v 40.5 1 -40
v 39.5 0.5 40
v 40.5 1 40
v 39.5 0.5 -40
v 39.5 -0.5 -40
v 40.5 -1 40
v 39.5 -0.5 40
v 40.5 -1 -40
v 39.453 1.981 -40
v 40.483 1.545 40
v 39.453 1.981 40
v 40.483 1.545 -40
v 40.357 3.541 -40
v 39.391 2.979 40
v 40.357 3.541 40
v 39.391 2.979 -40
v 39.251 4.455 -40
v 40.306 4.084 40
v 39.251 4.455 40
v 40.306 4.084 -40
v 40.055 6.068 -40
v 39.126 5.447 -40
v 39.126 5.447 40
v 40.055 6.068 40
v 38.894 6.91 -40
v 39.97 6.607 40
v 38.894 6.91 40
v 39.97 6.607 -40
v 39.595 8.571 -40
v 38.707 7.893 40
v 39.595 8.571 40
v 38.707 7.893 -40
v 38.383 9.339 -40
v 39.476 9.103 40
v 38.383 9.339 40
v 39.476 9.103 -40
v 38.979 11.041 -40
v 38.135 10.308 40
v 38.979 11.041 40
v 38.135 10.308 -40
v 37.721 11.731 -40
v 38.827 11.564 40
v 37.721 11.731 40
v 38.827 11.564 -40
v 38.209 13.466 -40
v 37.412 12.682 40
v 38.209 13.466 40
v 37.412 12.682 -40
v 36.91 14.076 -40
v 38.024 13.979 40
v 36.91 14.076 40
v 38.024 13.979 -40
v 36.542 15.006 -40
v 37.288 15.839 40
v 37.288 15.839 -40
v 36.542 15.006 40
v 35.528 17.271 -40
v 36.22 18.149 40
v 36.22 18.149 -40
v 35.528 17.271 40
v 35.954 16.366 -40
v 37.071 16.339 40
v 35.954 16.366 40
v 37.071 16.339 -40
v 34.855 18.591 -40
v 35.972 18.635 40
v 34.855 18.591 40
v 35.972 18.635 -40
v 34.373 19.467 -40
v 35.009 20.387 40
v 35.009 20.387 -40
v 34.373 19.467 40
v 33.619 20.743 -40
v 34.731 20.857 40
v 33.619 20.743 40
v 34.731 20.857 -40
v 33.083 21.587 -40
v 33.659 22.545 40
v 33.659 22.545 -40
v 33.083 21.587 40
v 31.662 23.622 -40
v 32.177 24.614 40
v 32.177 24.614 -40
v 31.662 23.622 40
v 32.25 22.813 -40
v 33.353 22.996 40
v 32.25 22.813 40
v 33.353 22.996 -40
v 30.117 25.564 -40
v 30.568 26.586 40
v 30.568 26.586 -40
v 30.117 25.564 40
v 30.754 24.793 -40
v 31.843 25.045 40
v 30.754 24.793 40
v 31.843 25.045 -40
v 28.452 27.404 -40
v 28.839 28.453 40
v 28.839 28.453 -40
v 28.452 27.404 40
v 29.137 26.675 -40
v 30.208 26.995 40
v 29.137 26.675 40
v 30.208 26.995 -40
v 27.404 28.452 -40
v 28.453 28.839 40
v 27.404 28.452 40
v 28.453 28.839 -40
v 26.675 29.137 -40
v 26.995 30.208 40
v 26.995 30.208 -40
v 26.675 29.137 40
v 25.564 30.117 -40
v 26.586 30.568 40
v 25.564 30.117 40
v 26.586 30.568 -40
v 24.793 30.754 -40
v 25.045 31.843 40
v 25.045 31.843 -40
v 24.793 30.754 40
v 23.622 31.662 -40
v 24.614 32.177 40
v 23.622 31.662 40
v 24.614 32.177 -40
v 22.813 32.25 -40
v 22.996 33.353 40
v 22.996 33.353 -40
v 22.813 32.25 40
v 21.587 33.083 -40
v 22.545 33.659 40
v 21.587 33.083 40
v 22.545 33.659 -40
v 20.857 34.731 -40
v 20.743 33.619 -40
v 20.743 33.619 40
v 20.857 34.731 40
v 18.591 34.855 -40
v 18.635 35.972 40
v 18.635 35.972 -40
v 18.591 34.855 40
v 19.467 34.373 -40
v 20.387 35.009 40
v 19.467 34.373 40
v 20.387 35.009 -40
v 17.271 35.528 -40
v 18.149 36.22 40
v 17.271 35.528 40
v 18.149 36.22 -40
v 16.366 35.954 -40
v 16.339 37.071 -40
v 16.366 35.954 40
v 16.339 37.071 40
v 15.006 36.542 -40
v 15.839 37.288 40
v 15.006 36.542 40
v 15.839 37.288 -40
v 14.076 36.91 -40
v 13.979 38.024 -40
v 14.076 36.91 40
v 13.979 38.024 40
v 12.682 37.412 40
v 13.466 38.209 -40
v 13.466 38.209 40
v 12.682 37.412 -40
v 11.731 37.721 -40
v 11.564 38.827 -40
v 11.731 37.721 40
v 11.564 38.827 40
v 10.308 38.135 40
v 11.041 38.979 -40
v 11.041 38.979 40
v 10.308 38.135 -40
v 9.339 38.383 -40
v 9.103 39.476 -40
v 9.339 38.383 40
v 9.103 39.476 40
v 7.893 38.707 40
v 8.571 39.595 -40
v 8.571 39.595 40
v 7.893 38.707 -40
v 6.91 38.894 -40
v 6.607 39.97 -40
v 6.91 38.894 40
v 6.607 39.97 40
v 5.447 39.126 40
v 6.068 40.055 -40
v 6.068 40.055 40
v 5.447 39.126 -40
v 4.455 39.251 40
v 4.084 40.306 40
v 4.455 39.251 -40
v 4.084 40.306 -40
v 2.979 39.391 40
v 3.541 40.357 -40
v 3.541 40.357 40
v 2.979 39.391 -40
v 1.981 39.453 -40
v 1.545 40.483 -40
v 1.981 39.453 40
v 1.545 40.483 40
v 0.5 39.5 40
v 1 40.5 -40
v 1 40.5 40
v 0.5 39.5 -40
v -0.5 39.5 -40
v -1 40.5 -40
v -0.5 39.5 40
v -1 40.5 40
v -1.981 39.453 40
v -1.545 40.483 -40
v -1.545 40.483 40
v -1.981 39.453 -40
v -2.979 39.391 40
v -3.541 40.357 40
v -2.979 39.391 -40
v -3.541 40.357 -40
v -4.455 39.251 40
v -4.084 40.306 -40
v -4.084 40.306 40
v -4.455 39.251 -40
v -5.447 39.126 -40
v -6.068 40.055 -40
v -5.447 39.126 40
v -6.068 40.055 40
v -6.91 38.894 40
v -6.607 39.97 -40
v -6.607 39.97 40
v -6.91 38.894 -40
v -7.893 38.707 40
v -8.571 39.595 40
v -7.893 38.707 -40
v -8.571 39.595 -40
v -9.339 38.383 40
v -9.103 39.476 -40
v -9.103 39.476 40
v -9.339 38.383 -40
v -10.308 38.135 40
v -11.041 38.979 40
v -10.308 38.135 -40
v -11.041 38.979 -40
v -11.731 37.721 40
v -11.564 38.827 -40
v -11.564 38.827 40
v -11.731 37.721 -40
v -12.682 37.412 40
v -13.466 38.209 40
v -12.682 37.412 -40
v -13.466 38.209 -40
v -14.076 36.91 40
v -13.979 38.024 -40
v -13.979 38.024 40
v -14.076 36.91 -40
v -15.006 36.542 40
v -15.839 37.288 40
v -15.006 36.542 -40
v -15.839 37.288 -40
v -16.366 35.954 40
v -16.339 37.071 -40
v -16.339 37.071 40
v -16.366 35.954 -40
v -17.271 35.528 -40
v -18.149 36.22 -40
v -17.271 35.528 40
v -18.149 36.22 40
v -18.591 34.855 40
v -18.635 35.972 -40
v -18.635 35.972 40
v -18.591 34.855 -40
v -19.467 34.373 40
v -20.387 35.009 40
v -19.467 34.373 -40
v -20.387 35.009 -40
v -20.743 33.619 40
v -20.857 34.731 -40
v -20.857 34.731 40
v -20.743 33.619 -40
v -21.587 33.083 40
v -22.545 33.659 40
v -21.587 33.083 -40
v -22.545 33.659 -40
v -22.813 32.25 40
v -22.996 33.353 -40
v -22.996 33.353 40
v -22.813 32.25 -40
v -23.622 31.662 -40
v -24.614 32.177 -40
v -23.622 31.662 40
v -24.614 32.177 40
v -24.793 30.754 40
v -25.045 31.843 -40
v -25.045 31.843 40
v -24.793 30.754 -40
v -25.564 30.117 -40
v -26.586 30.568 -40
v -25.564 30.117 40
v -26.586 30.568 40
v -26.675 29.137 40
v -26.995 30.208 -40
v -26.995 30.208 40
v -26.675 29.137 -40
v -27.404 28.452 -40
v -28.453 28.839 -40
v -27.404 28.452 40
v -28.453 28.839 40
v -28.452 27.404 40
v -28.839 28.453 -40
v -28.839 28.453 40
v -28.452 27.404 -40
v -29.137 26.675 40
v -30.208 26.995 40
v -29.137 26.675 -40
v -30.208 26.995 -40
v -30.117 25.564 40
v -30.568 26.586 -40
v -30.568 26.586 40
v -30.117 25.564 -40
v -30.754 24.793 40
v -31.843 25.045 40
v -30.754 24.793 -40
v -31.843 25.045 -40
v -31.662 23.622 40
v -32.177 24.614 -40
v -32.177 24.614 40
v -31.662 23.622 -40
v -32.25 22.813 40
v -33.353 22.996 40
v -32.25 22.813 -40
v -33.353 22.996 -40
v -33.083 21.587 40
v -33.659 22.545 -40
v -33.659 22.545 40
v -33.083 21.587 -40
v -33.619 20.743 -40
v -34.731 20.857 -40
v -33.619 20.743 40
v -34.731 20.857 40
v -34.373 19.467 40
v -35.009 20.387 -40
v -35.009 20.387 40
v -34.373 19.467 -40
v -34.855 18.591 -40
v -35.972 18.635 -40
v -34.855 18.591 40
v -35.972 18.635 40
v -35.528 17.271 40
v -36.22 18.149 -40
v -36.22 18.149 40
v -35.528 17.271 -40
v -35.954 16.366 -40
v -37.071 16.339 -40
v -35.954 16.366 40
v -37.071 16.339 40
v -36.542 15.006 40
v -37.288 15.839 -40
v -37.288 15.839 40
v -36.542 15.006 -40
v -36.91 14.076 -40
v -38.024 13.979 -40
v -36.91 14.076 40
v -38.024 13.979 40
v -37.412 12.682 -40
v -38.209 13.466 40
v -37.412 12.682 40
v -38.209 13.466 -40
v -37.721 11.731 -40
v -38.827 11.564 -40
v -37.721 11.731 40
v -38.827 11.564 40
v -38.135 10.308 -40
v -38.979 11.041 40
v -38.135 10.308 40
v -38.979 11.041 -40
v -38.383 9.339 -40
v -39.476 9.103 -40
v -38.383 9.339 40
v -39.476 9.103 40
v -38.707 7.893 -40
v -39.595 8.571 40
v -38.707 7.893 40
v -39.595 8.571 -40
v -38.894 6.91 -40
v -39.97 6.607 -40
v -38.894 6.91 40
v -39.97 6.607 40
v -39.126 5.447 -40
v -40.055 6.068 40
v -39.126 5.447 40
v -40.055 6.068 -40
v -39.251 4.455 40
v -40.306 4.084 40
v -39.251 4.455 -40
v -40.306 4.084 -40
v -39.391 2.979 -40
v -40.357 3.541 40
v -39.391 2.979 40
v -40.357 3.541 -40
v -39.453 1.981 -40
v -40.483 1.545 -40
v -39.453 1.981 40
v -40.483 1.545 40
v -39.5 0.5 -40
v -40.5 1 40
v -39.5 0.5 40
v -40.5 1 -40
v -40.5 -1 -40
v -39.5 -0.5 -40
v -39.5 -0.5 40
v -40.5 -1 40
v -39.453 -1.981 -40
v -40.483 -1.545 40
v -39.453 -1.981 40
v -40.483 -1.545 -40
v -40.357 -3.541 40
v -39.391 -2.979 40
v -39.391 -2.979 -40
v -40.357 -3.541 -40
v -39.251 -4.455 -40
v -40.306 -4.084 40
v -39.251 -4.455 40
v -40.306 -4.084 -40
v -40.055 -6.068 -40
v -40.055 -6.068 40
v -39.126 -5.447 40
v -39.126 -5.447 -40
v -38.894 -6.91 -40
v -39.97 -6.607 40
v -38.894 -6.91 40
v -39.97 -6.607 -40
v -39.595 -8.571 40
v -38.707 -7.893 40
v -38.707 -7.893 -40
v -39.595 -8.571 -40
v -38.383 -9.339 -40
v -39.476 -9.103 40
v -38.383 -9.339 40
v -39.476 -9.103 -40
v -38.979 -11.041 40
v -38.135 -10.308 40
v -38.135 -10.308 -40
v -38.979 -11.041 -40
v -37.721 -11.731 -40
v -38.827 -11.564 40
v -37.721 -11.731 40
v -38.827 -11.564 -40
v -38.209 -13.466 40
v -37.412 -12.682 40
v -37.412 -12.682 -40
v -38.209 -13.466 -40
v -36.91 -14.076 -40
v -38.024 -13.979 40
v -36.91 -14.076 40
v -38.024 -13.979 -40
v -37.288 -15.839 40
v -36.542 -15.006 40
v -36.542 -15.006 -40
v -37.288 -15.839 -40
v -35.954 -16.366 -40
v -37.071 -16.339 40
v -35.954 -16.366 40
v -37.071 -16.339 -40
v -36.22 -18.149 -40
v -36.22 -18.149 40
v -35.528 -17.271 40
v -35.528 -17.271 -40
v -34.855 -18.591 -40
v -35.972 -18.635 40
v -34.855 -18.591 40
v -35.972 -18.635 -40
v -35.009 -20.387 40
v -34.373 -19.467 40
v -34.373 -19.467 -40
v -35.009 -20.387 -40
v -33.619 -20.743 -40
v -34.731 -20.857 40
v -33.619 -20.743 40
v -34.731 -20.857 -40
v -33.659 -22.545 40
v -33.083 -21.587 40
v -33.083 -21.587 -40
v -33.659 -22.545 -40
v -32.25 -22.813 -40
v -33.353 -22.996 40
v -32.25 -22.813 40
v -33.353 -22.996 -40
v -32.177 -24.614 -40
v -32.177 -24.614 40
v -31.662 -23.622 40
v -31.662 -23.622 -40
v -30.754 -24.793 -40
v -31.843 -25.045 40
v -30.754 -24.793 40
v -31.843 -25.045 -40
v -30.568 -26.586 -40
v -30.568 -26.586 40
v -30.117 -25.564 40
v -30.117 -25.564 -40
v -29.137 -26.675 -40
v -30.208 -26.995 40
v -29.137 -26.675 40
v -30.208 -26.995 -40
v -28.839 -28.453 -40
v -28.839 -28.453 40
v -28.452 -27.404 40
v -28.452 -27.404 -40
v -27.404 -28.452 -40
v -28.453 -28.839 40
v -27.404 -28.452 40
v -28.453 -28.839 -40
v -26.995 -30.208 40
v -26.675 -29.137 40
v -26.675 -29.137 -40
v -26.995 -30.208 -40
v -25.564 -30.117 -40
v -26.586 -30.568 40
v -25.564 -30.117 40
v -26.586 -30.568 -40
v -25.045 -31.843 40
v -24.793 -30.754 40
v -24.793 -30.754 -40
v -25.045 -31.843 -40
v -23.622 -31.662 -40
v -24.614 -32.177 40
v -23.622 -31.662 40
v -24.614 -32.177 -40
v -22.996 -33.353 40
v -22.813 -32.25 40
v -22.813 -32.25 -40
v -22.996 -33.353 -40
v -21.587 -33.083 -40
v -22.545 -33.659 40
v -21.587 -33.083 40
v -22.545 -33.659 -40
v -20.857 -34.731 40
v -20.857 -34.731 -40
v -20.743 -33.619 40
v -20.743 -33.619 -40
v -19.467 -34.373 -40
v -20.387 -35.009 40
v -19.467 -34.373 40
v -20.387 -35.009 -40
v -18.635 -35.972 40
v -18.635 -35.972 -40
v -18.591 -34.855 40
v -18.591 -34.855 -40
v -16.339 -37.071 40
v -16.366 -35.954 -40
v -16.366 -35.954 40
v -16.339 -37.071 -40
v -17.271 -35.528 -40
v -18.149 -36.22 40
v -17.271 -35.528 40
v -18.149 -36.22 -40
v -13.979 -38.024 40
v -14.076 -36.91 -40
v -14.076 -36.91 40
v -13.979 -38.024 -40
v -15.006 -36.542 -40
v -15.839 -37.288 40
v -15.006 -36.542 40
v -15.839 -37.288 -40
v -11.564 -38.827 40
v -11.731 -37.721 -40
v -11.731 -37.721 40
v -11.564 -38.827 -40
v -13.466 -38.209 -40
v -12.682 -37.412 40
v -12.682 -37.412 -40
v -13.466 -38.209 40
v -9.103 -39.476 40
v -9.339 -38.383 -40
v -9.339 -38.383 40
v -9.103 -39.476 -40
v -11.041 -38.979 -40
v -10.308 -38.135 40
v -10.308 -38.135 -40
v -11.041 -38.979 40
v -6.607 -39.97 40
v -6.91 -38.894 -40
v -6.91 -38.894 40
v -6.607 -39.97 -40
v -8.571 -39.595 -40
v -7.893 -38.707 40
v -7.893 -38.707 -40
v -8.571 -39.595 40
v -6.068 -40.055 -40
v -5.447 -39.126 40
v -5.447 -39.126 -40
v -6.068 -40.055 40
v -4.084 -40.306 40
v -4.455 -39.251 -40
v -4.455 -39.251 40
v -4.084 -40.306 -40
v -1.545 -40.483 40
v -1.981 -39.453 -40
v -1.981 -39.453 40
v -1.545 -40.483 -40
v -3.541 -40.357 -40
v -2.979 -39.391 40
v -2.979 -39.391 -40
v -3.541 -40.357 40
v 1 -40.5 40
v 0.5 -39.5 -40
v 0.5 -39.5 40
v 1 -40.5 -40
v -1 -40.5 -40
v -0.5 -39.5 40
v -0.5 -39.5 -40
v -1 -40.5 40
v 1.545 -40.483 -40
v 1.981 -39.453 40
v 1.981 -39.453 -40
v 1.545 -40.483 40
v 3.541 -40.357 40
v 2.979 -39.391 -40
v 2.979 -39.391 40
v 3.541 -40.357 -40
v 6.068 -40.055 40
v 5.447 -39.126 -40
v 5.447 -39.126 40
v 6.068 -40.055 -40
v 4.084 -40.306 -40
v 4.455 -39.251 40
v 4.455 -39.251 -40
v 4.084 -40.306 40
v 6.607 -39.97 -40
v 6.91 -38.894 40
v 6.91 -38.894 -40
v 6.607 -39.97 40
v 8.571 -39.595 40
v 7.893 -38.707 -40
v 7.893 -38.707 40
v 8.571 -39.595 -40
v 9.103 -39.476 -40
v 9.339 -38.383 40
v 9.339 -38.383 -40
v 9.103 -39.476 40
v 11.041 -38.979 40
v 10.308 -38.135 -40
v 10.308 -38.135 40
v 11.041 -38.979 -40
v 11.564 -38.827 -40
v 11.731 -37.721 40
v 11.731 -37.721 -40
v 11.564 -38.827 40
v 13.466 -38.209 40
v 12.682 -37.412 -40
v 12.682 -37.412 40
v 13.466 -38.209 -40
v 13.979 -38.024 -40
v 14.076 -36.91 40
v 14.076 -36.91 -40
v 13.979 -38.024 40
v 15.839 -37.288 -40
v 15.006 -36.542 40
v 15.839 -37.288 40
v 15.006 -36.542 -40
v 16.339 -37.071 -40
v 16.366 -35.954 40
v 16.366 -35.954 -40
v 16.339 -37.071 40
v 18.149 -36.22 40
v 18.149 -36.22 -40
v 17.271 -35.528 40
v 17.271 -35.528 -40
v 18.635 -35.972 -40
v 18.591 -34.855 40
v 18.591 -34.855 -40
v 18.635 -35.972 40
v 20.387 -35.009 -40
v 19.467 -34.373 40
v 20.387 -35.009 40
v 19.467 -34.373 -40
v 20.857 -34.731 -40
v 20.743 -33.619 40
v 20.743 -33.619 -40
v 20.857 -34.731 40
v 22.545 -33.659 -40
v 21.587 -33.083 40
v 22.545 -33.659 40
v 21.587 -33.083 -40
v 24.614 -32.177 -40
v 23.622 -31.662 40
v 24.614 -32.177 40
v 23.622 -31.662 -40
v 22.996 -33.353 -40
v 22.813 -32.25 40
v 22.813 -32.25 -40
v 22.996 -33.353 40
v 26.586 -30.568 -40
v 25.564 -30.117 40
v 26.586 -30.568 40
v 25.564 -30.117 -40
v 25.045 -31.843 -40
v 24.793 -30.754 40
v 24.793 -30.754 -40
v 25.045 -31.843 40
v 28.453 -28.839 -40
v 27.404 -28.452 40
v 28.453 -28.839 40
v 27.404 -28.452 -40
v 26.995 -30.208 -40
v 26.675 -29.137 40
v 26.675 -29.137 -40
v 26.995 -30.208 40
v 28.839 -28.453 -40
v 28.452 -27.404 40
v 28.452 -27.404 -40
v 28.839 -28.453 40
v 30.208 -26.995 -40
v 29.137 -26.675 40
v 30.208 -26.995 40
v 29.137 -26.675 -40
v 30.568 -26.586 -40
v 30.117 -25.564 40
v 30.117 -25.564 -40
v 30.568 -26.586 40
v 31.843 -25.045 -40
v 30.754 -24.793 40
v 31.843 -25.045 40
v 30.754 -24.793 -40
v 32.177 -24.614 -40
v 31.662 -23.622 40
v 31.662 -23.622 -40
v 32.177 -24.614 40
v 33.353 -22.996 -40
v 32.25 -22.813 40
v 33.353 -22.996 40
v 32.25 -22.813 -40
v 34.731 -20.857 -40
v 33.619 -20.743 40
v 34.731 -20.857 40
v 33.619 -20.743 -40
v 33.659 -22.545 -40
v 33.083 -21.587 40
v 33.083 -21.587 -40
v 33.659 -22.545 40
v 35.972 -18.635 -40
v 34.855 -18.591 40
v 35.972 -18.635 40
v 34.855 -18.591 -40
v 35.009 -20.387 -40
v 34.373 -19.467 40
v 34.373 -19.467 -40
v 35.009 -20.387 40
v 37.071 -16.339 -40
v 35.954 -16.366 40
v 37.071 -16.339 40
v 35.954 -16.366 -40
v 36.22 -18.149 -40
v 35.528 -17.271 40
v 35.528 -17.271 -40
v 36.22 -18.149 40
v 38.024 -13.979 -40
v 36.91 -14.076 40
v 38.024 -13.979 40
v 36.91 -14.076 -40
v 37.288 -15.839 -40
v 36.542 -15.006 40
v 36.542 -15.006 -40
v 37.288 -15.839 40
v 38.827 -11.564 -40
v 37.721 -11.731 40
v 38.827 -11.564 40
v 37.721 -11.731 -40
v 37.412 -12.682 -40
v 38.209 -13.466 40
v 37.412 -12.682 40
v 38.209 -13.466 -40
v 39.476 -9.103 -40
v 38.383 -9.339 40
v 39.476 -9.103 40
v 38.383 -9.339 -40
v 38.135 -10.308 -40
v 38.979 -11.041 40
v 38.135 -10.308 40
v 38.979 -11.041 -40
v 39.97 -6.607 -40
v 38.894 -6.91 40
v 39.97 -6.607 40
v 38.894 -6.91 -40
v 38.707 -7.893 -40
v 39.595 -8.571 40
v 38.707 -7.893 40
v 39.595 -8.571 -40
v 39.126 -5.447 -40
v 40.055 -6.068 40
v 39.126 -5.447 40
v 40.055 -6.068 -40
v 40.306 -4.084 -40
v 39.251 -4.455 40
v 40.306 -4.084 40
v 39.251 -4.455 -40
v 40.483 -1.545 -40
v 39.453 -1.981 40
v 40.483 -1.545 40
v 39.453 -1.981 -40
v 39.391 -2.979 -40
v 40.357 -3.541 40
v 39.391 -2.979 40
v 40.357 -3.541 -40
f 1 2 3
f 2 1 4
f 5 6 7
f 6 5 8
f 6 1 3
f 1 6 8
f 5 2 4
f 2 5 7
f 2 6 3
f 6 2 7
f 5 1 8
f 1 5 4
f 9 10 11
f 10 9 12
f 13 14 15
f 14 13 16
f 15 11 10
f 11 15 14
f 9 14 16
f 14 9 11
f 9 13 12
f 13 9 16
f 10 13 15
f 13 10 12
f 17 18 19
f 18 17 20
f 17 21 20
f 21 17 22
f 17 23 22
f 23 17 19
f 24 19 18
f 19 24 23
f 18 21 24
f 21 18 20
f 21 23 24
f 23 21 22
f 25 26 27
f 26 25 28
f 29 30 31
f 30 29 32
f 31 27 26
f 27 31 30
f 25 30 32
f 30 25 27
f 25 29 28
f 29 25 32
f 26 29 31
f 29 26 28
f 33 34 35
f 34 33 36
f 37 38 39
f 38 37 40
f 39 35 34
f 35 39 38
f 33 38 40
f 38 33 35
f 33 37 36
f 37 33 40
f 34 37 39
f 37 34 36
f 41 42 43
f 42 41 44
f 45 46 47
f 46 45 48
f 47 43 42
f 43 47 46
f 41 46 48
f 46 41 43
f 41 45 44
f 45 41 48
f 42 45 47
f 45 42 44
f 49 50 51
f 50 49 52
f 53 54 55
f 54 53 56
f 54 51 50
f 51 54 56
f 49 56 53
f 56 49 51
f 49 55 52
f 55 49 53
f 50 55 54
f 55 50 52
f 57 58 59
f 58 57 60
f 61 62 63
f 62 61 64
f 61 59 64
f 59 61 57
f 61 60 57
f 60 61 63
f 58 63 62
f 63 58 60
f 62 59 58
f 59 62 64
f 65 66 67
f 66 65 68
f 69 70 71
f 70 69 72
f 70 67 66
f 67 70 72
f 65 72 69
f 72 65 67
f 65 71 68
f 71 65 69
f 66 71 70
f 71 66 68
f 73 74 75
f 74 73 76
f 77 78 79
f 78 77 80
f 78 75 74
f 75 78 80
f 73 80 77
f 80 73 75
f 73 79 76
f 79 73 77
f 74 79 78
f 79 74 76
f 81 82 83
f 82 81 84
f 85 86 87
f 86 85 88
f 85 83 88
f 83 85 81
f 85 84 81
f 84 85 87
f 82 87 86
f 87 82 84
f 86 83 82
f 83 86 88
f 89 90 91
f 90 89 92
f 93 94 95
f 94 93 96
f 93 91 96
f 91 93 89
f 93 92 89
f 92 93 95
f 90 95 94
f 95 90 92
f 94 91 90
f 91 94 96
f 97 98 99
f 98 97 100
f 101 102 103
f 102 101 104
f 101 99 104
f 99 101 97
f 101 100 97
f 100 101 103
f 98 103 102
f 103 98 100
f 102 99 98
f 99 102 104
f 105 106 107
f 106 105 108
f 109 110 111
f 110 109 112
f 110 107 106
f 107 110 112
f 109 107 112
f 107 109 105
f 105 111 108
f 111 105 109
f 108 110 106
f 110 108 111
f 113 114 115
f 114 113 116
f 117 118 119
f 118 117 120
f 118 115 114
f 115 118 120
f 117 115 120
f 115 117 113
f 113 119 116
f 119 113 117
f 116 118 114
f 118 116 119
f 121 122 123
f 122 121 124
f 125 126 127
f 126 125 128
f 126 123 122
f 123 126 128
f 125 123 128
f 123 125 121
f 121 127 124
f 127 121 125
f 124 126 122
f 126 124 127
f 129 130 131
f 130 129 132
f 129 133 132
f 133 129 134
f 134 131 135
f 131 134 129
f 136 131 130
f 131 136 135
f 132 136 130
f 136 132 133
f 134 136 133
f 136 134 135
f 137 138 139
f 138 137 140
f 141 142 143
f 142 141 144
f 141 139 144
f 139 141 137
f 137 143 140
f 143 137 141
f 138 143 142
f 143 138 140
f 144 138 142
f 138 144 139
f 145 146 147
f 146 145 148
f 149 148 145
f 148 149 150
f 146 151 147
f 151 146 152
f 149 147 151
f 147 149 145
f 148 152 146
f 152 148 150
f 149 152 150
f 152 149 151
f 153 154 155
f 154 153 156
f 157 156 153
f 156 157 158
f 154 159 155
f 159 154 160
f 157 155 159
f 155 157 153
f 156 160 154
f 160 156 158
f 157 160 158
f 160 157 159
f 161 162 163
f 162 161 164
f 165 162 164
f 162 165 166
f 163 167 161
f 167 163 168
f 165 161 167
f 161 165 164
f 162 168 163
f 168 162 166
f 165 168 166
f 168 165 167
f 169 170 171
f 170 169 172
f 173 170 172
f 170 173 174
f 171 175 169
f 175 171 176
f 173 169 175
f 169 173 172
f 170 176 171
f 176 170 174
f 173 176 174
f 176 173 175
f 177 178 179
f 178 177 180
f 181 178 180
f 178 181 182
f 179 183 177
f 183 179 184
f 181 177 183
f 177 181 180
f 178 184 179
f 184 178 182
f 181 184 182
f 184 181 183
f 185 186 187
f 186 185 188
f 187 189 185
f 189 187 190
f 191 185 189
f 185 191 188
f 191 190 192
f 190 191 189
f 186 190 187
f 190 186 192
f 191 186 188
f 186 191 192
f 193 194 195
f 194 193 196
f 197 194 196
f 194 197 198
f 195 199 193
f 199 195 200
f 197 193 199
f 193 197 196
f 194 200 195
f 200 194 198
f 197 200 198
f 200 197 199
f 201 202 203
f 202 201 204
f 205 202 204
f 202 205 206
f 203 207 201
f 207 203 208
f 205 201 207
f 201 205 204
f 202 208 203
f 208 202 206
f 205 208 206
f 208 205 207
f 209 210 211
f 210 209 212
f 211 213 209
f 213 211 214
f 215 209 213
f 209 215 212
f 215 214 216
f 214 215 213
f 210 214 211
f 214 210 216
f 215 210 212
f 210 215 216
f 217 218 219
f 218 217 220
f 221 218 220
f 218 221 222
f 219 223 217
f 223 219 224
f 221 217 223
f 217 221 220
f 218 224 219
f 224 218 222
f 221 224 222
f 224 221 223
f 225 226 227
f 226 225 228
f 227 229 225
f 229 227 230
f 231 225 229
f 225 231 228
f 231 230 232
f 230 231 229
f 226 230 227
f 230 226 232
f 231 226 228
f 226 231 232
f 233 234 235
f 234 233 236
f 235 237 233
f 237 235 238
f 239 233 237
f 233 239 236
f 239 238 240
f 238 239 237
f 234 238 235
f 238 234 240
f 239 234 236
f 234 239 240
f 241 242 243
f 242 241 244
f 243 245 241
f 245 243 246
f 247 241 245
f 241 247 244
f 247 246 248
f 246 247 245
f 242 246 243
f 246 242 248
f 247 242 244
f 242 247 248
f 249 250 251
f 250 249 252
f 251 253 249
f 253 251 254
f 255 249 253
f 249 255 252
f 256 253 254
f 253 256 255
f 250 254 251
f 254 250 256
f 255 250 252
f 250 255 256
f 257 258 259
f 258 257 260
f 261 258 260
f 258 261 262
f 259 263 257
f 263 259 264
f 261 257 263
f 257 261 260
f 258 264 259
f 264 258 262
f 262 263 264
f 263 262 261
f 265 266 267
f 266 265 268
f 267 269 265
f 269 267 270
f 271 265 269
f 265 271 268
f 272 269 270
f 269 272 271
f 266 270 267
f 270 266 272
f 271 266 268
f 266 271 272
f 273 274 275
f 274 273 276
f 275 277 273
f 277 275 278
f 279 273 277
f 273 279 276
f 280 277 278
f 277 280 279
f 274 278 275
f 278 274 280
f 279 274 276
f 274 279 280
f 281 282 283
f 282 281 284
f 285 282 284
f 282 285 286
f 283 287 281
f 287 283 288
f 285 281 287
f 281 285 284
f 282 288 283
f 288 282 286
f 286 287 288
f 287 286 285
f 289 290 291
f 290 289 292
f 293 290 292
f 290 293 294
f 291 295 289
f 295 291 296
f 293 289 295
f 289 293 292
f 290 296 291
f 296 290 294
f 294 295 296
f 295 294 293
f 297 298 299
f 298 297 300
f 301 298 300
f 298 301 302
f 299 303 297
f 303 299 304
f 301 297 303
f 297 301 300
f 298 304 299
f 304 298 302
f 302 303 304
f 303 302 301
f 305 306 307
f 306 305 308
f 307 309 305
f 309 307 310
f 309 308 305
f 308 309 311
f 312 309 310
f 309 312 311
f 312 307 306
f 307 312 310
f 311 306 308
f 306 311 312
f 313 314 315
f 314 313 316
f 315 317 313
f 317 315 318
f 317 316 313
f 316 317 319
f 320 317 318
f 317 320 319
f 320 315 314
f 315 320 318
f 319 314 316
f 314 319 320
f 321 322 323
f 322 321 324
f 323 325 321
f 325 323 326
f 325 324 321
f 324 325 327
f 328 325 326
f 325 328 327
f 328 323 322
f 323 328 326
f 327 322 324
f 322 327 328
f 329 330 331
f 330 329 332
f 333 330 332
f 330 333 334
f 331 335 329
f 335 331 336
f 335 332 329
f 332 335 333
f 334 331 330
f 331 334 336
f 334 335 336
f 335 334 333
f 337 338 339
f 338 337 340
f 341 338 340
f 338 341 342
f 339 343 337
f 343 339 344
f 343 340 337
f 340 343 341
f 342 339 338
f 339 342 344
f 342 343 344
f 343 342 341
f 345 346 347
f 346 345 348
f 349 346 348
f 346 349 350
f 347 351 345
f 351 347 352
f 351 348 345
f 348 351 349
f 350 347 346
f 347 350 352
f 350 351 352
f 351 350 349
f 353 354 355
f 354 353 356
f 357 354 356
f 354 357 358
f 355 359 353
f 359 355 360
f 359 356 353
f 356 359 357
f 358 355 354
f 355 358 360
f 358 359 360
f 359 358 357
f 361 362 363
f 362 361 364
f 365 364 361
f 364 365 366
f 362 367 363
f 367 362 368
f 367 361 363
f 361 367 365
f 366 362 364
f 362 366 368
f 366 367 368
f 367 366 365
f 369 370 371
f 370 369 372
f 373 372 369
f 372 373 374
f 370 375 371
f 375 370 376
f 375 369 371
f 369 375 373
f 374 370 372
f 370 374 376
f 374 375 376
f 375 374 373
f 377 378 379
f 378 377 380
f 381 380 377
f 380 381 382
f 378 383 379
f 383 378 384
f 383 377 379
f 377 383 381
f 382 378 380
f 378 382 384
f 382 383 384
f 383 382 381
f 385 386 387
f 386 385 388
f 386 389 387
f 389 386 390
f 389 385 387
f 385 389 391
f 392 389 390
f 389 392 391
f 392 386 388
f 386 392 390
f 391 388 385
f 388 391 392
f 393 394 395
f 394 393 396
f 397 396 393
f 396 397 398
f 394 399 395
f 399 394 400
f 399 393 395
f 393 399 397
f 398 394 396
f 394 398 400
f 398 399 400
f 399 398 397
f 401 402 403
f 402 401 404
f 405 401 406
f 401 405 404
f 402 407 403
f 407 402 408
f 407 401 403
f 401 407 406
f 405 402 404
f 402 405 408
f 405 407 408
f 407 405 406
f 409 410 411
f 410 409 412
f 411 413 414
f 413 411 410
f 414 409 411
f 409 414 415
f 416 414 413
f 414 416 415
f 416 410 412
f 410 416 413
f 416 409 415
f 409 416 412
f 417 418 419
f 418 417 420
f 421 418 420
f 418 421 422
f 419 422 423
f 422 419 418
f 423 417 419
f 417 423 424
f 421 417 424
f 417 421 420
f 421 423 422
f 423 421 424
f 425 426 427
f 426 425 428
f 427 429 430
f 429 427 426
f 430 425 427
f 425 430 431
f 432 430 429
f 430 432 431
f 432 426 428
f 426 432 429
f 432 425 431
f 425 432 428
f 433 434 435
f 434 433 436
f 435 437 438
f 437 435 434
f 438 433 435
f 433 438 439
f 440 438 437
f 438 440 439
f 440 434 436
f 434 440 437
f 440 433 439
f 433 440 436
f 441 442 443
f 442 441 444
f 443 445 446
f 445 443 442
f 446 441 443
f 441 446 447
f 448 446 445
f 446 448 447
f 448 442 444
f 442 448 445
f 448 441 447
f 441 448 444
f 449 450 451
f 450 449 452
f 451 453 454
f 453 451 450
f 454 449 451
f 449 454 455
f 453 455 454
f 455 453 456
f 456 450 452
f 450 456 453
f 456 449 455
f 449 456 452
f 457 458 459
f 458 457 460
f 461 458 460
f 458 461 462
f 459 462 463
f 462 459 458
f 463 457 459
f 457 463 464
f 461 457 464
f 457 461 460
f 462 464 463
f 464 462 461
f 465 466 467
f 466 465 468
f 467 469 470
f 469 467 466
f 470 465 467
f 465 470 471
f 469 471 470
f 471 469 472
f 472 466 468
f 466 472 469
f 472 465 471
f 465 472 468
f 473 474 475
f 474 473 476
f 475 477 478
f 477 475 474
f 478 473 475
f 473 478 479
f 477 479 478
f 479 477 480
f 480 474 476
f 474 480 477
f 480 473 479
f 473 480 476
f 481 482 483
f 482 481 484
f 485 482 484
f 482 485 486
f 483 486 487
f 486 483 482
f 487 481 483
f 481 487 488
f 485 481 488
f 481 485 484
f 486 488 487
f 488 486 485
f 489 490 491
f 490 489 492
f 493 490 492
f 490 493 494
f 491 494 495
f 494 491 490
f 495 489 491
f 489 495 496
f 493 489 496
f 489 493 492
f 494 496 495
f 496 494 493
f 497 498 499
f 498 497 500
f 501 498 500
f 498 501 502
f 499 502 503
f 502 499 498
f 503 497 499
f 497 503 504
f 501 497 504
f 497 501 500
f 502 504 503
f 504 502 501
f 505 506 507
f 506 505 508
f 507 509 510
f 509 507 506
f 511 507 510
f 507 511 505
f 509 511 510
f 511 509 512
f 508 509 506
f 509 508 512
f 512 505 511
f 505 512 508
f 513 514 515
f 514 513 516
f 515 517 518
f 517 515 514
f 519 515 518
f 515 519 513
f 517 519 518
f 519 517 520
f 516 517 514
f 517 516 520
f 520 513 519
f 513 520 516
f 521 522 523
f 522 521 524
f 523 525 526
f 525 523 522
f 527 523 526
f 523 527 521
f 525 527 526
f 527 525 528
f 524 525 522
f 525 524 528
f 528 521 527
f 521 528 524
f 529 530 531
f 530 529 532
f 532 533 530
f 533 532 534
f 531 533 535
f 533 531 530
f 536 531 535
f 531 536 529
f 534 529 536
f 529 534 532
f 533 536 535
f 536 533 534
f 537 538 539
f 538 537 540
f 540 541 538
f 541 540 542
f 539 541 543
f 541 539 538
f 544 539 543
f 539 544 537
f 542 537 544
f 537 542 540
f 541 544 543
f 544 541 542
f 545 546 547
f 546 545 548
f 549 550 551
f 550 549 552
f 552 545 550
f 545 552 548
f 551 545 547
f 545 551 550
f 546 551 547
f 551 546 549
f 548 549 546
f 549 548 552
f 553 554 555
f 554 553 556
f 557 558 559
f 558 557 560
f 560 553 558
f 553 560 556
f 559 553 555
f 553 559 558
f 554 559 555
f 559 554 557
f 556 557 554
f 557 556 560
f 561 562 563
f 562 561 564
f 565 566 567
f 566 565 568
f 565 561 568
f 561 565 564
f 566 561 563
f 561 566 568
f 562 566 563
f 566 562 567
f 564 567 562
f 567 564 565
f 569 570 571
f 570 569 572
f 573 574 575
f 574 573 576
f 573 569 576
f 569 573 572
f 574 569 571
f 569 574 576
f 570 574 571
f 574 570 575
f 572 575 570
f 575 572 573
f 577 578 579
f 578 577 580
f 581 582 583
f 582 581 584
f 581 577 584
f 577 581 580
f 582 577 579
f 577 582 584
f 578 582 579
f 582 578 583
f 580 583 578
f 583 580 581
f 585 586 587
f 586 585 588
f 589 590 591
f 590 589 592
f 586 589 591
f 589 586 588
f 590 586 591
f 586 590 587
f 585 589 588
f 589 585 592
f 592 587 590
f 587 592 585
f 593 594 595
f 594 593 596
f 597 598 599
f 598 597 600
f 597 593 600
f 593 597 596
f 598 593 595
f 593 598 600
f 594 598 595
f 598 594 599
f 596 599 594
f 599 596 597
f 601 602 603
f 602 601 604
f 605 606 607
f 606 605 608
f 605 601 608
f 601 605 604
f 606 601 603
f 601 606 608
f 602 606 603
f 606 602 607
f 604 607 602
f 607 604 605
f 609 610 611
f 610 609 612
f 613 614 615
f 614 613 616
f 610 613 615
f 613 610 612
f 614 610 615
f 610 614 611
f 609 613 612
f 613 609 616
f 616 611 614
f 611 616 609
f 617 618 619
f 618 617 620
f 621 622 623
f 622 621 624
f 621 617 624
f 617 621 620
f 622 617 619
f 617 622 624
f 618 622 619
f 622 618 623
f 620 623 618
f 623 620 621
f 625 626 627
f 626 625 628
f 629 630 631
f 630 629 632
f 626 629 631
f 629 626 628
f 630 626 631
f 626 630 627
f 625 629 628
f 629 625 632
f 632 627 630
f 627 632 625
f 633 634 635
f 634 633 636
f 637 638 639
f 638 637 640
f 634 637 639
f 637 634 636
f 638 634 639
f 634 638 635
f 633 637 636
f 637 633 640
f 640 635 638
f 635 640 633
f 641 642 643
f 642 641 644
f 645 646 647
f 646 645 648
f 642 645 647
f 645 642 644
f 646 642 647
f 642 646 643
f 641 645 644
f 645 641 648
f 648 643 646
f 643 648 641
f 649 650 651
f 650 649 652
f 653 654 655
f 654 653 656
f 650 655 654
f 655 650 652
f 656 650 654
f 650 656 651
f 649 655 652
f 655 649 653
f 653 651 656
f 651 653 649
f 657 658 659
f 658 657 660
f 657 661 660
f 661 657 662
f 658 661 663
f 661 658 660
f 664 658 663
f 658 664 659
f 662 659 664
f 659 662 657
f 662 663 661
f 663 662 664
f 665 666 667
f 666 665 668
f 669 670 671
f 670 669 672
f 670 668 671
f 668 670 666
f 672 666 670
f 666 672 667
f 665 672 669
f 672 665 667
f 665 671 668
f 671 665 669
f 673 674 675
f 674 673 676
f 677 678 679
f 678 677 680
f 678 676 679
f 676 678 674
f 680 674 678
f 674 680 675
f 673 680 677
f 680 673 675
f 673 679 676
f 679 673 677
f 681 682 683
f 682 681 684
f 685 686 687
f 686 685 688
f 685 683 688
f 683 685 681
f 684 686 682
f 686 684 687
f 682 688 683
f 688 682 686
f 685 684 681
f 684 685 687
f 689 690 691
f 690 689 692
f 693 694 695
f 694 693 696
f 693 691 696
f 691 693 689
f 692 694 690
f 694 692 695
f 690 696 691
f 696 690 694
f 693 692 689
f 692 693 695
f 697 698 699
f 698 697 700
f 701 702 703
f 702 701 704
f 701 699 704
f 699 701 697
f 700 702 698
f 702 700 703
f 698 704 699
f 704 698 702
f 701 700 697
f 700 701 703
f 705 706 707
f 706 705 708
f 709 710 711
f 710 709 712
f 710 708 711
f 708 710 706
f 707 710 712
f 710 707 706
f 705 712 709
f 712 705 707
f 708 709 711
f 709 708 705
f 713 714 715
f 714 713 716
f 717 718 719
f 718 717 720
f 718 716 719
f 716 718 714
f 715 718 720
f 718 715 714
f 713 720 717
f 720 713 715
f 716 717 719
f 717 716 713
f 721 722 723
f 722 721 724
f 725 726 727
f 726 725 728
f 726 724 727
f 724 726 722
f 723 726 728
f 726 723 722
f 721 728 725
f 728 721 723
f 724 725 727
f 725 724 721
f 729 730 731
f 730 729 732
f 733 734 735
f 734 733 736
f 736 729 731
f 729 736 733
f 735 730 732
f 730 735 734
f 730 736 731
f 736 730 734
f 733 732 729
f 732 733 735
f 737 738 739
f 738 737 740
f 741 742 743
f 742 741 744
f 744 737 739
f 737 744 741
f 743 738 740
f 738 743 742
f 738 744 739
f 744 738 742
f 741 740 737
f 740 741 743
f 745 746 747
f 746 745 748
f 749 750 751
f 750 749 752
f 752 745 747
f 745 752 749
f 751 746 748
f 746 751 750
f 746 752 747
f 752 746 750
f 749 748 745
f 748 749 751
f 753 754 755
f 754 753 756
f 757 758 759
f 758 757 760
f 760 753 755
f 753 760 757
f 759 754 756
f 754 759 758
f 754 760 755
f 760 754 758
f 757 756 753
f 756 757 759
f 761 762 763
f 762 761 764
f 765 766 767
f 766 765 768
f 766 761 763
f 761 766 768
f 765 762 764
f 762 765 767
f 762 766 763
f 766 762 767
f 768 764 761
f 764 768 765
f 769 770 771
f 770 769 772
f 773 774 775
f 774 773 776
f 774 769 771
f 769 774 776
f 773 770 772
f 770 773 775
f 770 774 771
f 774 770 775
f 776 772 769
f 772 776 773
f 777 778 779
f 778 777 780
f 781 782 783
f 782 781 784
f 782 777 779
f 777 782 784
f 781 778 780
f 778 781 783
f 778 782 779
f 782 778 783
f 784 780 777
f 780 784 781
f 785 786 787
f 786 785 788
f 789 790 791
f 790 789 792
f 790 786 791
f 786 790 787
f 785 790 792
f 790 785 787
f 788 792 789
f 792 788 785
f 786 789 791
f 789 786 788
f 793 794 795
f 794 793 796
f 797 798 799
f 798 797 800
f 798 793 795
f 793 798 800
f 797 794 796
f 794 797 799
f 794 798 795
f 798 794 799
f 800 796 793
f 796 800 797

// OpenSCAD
//-- Parametros del trapecio
B = 2; //-- Base larga
b = 1; //-- Base corta
h = 1; //-- Altura

module diente(){
//-- Rotar prisma para apoyarlo en plano xy
rotate([0, 0, 90])

//-- Extrusion lineal del trapecio
linear_extrude(height = 80, center = true)

//-- Trapecio
polygon(points = [
                  [-B/2, -h/2],
                  [-b/2, h/2],
                  [b/2, h/2],
                  [B/2, -h/2]
                 ]);
                 
}

 polar_array(radius=40,cantidad=100){
        diente();
        }
        
//modulo para hacer arreglos polares de un objeto 
module polar_array(radius, cantidad){
    for (i=[0:360/cantidad:360]){
            rotate([0,0,i])
            translate([radius,0,0])
            children();      
    }
}
